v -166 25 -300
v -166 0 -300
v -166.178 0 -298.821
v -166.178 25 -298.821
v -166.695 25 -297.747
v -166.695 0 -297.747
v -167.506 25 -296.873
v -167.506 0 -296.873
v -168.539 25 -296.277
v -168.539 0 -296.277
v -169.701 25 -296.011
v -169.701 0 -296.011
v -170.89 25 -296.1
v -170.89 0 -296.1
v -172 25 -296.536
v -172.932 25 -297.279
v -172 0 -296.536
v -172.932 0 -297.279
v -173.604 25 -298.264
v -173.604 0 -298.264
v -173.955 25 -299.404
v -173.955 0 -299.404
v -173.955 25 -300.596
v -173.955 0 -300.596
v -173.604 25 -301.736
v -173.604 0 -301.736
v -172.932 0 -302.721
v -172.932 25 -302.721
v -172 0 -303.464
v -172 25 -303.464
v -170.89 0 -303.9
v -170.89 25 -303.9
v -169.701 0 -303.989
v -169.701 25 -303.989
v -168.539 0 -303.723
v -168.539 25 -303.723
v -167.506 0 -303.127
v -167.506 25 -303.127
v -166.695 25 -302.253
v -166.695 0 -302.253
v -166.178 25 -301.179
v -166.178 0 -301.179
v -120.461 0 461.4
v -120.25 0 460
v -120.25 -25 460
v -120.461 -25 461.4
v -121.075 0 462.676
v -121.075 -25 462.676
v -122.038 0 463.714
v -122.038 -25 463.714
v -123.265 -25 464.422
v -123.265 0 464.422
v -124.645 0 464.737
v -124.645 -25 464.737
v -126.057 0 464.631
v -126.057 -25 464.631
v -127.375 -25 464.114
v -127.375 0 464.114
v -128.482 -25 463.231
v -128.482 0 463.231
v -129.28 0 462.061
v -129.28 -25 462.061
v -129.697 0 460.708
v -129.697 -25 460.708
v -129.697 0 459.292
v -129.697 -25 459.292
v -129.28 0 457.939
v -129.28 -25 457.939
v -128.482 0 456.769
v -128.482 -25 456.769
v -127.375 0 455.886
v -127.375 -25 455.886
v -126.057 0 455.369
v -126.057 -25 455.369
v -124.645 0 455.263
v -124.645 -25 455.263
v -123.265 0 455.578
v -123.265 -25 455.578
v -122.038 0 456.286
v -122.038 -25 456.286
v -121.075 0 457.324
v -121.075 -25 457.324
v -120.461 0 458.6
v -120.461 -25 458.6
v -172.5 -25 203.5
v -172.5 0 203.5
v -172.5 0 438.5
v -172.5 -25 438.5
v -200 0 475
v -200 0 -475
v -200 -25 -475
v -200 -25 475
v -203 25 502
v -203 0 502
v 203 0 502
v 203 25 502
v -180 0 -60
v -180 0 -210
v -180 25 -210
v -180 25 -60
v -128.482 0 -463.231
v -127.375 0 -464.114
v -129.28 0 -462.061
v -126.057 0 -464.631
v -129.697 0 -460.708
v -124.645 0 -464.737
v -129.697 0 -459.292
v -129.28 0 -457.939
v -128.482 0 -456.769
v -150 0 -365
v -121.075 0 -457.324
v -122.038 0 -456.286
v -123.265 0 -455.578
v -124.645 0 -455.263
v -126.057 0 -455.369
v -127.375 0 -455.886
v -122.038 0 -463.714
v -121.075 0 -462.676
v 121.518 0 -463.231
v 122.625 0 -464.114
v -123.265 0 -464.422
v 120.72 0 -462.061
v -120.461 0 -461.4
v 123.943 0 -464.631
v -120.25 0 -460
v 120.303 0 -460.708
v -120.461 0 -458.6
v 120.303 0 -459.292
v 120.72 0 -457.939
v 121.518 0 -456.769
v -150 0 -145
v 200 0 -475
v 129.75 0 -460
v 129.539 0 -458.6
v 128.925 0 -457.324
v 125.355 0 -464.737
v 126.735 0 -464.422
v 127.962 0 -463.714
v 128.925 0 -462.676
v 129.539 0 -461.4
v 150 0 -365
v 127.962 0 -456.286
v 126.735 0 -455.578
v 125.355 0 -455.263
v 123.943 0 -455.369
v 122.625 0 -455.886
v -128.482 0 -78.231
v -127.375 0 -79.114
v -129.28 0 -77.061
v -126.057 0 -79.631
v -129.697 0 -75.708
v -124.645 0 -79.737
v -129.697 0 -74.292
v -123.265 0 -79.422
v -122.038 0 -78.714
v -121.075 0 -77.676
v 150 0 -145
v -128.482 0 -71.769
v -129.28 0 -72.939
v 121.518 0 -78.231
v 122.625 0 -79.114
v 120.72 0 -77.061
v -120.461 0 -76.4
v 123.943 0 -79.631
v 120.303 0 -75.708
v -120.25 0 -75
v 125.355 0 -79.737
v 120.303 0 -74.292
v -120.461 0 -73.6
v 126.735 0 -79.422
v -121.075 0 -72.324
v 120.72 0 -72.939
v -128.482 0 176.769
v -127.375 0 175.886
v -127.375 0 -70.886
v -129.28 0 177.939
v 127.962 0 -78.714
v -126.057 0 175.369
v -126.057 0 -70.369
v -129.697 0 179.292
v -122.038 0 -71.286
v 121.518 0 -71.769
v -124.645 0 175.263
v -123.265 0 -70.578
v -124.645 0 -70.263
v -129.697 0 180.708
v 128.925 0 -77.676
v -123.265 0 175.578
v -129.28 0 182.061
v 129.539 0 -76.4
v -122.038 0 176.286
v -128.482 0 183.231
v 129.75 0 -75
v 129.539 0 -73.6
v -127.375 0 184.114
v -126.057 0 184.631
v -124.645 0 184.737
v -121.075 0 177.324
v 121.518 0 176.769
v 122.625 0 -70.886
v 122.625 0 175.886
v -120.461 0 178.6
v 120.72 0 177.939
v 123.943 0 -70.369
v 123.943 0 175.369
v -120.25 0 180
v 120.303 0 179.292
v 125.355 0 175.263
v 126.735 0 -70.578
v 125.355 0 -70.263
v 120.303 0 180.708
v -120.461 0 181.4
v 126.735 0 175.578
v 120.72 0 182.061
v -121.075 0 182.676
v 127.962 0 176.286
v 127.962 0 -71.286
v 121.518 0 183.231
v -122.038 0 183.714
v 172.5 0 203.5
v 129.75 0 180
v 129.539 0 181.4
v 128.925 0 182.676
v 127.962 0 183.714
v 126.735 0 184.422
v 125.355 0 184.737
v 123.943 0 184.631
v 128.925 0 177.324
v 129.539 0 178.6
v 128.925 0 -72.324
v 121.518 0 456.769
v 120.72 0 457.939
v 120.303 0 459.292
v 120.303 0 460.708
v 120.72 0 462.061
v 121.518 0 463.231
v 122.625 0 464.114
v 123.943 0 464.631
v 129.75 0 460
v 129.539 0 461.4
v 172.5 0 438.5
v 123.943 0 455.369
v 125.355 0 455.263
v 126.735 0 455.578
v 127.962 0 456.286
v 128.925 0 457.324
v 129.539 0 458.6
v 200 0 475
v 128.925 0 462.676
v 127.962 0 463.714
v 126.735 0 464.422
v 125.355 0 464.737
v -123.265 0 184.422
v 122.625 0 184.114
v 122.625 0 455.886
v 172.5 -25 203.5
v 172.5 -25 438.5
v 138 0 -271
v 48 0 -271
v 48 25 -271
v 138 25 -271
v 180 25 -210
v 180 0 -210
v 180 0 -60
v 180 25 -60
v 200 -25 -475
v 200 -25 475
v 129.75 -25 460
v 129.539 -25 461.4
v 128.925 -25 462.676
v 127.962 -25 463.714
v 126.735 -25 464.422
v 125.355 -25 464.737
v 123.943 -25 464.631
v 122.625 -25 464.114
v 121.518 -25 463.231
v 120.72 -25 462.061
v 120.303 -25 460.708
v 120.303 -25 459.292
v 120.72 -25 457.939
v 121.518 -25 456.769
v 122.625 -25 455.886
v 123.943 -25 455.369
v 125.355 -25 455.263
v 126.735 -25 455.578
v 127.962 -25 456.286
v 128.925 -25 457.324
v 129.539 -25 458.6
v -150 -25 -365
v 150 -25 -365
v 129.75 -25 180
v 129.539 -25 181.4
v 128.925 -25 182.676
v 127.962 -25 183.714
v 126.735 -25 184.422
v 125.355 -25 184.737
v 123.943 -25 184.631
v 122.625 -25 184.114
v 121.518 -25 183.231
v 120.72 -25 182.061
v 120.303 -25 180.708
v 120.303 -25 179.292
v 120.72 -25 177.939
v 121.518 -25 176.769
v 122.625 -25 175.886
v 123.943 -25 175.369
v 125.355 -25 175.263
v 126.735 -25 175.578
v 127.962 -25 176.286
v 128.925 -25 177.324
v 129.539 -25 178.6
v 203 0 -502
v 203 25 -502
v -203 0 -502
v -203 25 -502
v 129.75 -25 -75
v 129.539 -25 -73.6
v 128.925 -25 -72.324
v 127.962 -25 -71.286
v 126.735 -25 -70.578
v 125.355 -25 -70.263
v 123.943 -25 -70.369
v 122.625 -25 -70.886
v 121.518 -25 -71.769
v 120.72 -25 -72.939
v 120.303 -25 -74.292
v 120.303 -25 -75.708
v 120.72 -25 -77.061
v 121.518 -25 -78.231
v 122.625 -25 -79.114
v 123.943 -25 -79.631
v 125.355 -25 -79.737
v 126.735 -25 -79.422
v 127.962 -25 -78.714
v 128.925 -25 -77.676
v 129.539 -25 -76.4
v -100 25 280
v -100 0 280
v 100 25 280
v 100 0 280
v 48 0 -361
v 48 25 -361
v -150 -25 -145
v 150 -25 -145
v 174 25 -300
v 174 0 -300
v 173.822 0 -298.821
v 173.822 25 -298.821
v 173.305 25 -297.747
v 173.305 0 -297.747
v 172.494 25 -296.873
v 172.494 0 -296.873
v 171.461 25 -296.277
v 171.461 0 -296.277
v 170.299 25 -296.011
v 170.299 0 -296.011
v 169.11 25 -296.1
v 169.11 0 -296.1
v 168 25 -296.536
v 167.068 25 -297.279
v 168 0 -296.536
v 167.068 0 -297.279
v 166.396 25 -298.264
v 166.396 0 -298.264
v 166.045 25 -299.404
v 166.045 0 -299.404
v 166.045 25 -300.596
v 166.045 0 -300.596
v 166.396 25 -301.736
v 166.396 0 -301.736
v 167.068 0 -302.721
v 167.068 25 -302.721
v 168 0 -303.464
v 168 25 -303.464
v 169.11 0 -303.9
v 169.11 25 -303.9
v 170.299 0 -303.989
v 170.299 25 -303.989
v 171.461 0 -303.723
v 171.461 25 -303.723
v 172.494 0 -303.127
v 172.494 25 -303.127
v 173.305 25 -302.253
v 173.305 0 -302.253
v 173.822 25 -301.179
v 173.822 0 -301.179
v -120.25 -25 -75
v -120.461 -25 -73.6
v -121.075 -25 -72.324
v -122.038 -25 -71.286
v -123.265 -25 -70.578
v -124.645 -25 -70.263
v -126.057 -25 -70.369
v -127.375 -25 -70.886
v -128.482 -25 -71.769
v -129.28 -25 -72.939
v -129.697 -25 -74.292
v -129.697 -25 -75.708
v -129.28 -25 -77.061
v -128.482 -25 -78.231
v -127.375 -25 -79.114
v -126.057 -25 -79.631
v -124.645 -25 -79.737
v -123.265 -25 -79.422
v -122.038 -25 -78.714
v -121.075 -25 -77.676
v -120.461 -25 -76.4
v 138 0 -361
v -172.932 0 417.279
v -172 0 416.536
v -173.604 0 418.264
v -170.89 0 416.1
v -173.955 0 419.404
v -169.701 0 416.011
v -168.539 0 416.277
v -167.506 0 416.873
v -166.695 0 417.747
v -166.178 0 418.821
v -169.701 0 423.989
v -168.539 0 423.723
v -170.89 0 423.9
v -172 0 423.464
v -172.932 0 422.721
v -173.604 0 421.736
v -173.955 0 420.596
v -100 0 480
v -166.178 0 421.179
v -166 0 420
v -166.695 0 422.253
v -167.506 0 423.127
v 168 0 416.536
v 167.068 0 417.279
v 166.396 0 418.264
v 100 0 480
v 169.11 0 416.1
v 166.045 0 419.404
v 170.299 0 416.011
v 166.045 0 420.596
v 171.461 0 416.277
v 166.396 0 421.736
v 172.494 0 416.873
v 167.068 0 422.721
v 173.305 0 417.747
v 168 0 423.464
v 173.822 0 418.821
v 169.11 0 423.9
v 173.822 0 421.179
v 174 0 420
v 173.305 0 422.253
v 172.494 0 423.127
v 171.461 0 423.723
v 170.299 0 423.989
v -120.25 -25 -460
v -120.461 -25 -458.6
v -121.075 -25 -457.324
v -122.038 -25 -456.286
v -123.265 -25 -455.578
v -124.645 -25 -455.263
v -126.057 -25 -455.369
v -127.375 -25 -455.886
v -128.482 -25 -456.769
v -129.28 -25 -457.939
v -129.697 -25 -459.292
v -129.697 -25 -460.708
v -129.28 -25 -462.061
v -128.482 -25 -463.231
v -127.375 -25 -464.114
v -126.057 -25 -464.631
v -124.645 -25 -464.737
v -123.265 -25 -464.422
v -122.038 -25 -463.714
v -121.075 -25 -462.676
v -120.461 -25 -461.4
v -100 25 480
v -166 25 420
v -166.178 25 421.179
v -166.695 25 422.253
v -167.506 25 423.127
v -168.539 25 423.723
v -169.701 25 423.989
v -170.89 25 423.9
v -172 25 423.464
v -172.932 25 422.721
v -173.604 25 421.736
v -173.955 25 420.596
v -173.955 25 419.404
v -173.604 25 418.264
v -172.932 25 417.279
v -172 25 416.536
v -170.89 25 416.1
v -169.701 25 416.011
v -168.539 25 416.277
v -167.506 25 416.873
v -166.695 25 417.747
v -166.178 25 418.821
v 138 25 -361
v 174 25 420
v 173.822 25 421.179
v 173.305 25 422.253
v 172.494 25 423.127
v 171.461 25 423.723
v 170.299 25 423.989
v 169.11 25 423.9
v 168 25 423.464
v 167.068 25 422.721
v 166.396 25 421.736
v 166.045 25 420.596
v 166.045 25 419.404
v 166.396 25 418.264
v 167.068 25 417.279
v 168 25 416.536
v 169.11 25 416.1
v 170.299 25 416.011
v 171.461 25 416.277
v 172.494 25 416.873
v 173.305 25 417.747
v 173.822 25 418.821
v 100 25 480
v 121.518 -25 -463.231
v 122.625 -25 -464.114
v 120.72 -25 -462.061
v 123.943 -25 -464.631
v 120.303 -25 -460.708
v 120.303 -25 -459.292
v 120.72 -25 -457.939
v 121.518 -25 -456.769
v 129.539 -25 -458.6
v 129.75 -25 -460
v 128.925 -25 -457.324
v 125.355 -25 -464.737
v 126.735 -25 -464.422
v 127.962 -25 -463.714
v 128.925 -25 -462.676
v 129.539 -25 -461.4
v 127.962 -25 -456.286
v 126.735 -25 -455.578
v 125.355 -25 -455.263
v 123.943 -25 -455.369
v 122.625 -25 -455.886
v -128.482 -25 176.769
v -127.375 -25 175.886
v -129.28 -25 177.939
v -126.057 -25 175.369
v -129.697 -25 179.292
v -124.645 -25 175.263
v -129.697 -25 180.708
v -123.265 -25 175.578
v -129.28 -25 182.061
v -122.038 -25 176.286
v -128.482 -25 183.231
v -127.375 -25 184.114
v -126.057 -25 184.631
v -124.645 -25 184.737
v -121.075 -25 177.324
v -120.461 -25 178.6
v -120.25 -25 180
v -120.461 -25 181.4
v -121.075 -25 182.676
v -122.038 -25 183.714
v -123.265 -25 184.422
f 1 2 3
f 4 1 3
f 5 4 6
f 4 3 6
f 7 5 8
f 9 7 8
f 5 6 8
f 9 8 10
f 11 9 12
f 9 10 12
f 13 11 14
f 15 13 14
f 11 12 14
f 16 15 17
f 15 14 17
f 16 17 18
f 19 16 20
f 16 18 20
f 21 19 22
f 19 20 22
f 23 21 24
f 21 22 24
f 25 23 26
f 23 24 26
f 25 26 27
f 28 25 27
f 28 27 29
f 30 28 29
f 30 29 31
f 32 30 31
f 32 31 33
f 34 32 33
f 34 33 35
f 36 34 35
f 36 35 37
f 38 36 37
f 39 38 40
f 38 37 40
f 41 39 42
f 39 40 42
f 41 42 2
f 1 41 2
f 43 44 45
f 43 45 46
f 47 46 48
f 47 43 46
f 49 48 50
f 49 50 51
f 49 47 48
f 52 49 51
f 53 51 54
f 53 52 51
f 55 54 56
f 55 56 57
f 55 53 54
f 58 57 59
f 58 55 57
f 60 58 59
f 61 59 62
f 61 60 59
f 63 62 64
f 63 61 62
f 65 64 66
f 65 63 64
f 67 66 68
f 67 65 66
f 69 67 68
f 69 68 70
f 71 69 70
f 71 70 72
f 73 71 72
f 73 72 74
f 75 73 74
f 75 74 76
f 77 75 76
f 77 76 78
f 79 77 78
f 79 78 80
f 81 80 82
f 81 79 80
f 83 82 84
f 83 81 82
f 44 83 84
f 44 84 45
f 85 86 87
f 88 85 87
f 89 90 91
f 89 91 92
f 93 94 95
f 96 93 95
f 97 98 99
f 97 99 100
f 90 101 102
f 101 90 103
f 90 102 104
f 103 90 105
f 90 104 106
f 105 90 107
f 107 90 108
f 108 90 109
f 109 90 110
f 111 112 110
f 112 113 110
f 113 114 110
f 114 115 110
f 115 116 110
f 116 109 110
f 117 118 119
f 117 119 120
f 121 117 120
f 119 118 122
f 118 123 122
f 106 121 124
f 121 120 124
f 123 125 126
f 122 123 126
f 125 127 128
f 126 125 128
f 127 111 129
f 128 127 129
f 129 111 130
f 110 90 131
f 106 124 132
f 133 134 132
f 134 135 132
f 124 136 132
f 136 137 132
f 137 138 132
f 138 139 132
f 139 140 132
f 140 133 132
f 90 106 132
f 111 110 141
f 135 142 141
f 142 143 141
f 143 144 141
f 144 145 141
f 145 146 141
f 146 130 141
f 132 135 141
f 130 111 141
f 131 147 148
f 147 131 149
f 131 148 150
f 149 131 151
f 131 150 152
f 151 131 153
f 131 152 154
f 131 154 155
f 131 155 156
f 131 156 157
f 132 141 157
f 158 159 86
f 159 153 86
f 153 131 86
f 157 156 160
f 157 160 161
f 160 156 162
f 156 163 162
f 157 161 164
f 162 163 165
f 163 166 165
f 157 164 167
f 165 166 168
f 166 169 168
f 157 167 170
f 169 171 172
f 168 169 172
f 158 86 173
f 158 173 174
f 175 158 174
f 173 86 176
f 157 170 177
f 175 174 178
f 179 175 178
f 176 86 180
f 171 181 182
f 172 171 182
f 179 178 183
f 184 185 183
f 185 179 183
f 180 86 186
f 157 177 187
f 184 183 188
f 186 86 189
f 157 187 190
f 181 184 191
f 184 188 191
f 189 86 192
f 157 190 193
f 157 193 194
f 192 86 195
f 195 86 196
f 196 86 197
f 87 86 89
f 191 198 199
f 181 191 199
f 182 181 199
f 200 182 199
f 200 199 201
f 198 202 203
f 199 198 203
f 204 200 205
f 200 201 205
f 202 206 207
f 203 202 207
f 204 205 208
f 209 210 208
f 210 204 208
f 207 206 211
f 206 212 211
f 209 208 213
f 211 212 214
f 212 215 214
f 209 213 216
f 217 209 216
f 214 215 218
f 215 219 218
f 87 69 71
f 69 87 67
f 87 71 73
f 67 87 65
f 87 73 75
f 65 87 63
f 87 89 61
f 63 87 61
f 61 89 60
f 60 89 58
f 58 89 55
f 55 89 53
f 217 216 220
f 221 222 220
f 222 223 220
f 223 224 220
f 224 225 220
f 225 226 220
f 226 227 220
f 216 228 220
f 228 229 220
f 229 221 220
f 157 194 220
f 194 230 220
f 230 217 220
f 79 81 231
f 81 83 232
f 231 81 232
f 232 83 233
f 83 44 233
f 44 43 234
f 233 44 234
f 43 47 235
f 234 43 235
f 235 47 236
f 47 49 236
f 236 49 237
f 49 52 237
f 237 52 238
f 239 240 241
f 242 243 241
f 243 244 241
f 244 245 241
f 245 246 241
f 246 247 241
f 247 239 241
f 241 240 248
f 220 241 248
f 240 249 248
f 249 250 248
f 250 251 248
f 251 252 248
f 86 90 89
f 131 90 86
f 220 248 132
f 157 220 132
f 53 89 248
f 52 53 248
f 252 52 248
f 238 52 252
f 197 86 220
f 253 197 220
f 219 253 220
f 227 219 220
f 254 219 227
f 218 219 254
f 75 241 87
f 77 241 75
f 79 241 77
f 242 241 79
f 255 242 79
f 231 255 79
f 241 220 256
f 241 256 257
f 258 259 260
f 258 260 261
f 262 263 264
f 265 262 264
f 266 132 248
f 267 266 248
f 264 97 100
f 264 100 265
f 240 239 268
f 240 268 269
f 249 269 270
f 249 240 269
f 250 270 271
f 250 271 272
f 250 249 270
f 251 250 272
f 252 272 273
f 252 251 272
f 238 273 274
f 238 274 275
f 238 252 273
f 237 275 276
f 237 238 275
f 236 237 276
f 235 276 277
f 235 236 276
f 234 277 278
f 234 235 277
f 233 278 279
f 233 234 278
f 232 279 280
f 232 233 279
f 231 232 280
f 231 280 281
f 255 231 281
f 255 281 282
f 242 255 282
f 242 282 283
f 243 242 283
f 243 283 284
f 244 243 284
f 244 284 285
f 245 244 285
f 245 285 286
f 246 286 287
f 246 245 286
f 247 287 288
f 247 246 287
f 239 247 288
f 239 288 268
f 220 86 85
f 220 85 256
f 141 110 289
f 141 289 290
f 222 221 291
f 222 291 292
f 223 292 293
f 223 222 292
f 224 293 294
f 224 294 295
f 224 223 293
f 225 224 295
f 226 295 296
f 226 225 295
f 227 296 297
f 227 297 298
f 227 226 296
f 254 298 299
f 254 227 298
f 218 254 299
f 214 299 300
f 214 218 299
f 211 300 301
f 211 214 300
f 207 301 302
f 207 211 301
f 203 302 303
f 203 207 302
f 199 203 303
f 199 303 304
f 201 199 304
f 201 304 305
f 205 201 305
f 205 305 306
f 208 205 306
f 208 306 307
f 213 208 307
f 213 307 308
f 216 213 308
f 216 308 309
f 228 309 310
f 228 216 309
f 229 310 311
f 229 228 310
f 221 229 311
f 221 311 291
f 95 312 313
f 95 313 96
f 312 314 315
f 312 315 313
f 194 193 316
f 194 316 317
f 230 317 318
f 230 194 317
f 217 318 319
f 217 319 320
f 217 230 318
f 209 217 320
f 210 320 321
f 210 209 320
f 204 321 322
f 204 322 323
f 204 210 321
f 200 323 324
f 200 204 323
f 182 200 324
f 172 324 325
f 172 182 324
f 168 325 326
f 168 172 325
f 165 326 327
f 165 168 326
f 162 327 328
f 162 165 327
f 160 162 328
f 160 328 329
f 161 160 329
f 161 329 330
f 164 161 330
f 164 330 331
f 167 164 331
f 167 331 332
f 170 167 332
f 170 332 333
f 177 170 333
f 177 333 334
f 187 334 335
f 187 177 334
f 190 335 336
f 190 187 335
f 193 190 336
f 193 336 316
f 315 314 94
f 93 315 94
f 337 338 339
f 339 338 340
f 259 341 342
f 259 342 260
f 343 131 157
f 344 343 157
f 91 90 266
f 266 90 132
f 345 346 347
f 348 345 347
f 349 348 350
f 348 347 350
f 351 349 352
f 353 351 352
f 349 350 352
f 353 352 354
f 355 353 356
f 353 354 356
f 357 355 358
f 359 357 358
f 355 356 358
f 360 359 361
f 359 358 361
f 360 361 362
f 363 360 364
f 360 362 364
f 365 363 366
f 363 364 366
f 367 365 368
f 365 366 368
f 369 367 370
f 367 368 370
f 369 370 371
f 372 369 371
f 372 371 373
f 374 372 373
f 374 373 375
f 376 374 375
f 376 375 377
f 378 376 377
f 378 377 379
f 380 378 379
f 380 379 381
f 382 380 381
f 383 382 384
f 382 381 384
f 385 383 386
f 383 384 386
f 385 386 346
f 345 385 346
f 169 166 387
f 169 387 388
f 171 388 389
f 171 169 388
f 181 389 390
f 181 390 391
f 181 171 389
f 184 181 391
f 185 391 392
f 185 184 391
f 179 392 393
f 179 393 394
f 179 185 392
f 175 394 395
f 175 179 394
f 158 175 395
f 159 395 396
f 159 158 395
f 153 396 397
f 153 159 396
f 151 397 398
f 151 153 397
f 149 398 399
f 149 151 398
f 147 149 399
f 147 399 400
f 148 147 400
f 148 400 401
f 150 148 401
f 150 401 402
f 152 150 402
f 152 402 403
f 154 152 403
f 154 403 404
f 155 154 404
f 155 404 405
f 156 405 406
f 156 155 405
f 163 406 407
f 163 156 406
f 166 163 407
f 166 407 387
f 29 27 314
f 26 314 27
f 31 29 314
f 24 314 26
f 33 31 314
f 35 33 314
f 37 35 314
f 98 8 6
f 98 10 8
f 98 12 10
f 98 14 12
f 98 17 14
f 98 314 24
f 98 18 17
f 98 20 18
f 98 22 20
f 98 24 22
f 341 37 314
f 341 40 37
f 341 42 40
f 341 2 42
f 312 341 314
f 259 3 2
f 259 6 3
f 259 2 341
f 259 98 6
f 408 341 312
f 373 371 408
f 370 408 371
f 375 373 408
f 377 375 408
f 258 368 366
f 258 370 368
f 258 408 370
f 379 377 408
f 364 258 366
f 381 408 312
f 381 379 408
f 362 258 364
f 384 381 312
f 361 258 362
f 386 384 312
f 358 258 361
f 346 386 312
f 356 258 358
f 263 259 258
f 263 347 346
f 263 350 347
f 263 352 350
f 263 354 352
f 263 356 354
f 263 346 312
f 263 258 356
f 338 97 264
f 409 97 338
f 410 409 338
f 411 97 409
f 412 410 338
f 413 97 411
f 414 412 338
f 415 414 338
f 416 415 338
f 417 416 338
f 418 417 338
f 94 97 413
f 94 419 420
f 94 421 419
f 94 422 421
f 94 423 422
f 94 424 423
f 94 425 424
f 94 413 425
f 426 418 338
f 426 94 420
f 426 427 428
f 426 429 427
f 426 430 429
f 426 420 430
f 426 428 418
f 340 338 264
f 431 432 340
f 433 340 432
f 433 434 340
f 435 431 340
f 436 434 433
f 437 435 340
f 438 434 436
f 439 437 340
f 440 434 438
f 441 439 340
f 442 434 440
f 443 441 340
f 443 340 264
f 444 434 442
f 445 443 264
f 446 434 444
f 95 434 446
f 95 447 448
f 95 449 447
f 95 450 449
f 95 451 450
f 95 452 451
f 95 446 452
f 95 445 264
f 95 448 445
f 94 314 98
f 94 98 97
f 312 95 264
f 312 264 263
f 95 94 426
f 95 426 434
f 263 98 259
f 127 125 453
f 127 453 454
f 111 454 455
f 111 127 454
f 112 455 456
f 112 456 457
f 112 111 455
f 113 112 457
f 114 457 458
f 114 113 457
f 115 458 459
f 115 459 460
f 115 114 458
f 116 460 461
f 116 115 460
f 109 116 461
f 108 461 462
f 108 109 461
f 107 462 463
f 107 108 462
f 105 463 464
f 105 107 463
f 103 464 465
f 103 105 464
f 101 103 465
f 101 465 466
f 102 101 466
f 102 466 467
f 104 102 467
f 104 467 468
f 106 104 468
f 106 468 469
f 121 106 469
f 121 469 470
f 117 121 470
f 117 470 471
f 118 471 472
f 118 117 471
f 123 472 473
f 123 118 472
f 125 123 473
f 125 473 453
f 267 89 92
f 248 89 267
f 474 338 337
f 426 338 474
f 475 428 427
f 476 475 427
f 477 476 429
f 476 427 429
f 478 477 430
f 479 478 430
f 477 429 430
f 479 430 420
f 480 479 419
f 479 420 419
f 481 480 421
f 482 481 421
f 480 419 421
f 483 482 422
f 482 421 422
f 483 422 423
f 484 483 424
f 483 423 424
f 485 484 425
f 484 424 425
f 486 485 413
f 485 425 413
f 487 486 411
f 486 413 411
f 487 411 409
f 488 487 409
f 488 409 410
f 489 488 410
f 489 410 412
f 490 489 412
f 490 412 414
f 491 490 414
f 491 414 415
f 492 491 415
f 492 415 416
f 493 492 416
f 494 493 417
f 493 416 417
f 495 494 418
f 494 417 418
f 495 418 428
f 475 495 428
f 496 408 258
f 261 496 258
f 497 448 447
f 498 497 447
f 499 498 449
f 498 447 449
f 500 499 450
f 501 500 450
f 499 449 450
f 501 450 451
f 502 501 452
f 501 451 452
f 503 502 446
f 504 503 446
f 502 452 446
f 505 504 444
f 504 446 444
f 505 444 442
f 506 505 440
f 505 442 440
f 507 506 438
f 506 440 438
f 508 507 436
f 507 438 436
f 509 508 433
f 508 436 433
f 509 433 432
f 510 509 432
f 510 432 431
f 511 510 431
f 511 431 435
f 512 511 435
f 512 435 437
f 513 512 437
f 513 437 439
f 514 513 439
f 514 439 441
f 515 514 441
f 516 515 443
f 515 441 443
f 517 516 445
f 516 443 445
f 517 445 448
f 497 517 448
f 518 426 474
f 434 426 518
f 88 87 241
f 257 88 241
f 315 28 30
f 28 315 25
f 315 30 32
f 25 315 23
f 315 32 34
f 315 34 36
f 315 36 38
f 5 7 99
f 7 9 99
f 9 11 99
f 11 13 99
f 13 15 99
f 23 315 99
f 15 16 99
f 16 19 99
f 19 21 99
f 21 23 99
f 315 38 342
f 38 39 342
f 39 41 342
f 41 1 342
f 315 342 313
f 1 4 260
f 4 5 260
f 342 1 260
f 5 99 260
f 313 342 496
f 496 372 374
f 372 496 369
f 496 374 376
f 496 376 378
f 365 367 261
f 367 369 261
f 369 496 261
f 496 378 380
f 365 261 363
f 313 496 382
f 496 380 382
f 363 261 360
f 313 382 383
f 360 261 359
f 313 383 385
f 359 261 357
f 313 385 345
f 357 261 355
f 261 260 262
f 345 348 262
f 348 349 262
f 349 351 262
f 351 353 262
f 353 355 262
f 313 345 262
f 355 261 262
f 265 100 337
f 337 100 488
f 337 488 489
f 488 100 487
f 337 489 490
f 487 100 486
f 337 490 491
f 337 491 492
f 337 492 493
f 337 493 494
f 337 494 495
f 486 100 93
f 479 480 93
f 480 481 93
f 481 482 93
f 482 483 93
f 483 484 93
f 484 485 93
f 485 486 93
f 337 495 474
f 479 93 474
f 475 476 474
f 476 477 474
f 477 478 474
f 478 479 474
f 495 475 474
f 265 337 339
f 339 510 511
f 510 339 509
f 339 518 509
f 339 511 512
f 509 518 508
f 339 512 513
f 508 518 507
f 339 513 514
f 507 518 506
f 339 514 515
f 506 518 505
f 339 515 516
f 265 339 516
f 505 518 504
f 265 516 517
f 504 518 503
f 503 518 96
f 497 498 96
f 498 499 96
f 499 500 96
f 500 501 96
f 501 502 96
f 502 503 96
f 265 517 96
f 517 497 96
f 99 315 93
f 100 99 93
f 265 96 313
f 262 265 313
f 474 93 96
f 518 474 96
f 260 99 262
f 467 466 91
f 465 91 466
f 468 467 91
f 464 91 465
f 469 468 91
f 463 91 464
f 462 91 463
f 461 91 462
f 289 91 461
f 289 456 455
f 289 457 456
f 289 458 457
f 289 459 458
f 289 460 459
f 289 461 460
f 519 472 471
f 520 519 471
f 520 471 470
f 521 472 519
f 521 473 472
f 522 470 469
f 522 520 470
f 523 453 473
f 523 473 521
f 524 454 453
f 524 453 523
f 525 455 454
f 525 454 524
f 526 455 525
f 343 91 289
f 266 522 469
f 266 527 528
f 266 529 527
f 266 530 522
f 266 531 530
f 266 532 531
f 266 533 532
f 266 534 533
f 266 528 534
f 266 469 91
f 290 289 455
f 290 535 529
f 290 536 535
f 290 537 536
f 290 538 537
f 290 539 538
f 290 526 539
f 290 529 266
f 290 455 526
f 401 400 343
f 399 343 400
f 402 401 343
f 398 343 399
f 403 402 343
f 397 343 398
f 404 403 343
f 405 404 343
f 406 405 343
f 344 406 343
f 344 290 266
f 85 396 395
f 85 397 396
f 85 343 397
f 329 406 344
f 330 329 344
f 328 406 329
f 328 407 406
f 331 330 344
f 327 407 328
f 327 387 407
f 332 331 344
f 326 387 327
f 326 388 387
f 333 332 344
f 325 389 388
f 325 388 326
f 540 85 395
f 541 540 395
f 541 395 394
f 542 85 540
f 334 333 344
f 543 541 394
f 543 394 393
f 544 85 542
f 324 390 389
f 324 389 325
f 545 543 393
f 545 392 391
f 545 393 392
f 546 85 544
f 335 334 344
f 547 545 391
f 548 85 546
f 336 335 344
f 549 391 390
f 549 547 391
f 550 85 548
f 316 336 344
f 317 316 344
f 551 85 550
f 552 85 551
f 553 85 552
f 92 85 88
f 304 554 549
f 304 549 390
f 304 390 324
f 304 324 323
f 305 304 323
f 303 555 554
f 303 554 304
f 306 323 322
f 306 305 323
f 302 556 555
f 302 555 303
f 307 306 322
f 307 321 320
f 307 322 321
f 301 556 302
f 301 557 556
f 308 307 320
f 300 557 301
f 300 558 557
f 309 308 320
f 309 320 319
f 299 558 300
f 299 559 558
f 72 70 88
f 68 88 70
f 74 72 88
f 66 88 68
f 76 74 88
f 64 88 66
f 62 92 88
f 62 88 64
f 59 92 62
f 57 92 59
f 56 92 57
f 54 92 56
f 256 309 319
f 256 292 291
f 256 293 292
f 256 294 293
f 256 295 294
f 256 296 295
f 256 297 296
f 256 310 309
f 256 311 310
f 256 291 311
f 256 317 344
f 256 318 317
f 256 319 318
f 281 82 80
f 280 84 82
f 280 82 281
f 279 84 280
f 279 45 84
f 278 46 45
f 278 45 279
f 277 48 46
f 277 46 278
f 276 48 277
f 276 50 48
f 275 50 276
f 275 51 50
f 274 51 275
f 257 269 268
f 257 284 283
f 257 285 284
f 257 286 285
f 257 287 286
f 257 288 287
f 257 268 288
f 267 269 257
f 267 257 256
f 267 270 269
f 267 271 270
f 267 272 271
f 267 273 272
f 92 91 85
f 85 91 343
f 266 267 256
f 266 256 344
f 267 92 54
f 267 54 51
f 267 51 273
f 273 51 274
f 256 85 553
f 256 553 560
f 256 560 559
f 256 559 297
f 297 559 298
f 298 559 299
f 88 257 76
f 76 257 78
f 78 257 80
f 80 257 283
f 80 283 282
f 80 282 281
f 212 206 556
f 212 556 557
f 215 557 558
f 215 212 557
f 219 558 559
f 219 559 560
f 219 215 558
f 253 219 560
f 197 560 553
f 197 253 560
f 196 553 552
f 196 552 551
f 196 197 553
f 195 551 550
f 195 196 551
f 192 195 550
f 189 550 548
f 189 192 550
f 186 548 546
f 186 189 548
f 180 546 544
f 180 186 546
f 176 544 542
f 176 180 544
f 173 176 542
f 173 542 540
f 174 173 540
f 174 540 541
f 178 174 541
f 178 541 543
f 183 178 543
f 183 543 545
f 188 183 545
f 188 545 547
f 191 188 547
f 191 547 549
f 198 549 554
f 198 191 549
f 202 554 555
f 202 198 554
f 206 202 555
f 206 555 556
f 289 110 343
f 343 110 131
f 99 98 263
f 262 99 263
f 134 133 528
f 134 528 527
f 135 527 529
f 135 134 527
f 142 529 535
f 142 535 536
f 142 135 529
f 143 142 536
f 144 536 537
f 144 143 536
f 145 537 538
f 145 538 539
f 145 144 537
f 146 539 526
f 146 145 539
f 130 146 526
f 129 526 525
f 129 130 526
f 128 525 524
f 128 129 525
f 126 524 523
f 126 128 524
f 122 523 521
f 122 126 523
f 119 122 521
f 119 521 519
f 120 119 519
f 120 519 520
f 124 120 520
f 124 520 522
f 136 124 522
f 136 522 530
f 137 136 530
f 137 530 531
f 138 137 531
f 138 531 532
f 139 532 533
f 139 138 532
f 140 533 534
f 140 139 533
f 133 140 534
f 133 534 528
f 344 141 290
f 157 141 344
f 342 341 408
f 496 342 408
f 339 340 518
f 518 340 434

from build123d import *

# Parameters (mm, degrees)
F0_W     = 406
F0_H     = 1004
F0_R     = 4
F0_W_2   = 90
F0_H_2   = 90
F0_W_3   = 360
F0_H_3   = 150
F0_W_4   = 200
F0_H_4   = 200
F1_DEPTH = 25
F2_W     = 400
F2_H     = 950
F2_R     = 4.75
F2_W_2   = 300
F2_H_2   = 220
F2_W_3   = 345
F2_H_3   = 235
F3_DEPTH = 25


with BuildPart() as f1:
    # F0 (on Front) → F1 (new body)
    with BuildSketch(Plane.XZ):
        Rectangle(F0_W, F0_H)
        with Locations((-170, -300)):
            Circle(F0_R, mode=Mode.SUBTRACT)
        with Locations((93, -316)):
            Rectangle(F0_W_2, F0_H_2, mode=Mode.SUBTRACT)
        with Locations((170, -300)):
            Circle(F0_R, mode=Mode.SUBTRACT)
        with Locations((0, -135)):
            Rectangle(F0_W_3, F0_H_3, mode=Mode.SUBTRACT)
        with Locations((-170, 420)):
            Circle(F0_R, mode=Mode.SUBTRACT)
        with Locations((0, 380)):
            Rectangle(F0_W_4, F0_H_4, mode=Mode.SUBTRACT)
        with Locations((170, 420)):
            Circle(F0_R, mode=Mode.SUBTRACT)
    extrude(amount=-F1_DEPTH)


with BuildPart() as f3:
    # F2 (on Front) → F3 (new body)
    with BuildSketch(Plane.XZ):
        Rectangle(F2_W, F2_H)
        with Locations((-125, -460)):
            Circle(F2_R, mode=Mode.SUBTRACT)
        with Locations((-125, -75)):
            Circle(F2_R, mode=Mode.SUBTRACT)
        with Locations((0, -255)):
            Rectangle(F2_W_2, F2_H_2, mode=Mode.SUBTRACT)
        with Locations((125, -460)):
            Circle(F2_R, mode=Mode.SUBTRACT)
        with Locations((125, -75)):
            Circle(F2_R, mode=Mode.SUBTRACT)
        with Locations((-125, 180)):
            Circle(F2_R, mode=Mode.SUBTRACT)
        with Locations((-125, 460)):
            Circle(F2_R, mode=Mode.SUBTRACT)
        with Locations((125, 180)):
            Circle(F2_R, mode=Mode.SUBTRACT)
        with Locations((0, 321)):
            Rectangle(F2_W_3, F2_H_3, mode=Mode.SUBTRACT)
        with Locations((125, 460)):
            Circle(F2_R, mode=Mode.SUBTRACT)
    extrude(amount=F3_DEPTH)


solid = Compound([f1.part, f3.part])
